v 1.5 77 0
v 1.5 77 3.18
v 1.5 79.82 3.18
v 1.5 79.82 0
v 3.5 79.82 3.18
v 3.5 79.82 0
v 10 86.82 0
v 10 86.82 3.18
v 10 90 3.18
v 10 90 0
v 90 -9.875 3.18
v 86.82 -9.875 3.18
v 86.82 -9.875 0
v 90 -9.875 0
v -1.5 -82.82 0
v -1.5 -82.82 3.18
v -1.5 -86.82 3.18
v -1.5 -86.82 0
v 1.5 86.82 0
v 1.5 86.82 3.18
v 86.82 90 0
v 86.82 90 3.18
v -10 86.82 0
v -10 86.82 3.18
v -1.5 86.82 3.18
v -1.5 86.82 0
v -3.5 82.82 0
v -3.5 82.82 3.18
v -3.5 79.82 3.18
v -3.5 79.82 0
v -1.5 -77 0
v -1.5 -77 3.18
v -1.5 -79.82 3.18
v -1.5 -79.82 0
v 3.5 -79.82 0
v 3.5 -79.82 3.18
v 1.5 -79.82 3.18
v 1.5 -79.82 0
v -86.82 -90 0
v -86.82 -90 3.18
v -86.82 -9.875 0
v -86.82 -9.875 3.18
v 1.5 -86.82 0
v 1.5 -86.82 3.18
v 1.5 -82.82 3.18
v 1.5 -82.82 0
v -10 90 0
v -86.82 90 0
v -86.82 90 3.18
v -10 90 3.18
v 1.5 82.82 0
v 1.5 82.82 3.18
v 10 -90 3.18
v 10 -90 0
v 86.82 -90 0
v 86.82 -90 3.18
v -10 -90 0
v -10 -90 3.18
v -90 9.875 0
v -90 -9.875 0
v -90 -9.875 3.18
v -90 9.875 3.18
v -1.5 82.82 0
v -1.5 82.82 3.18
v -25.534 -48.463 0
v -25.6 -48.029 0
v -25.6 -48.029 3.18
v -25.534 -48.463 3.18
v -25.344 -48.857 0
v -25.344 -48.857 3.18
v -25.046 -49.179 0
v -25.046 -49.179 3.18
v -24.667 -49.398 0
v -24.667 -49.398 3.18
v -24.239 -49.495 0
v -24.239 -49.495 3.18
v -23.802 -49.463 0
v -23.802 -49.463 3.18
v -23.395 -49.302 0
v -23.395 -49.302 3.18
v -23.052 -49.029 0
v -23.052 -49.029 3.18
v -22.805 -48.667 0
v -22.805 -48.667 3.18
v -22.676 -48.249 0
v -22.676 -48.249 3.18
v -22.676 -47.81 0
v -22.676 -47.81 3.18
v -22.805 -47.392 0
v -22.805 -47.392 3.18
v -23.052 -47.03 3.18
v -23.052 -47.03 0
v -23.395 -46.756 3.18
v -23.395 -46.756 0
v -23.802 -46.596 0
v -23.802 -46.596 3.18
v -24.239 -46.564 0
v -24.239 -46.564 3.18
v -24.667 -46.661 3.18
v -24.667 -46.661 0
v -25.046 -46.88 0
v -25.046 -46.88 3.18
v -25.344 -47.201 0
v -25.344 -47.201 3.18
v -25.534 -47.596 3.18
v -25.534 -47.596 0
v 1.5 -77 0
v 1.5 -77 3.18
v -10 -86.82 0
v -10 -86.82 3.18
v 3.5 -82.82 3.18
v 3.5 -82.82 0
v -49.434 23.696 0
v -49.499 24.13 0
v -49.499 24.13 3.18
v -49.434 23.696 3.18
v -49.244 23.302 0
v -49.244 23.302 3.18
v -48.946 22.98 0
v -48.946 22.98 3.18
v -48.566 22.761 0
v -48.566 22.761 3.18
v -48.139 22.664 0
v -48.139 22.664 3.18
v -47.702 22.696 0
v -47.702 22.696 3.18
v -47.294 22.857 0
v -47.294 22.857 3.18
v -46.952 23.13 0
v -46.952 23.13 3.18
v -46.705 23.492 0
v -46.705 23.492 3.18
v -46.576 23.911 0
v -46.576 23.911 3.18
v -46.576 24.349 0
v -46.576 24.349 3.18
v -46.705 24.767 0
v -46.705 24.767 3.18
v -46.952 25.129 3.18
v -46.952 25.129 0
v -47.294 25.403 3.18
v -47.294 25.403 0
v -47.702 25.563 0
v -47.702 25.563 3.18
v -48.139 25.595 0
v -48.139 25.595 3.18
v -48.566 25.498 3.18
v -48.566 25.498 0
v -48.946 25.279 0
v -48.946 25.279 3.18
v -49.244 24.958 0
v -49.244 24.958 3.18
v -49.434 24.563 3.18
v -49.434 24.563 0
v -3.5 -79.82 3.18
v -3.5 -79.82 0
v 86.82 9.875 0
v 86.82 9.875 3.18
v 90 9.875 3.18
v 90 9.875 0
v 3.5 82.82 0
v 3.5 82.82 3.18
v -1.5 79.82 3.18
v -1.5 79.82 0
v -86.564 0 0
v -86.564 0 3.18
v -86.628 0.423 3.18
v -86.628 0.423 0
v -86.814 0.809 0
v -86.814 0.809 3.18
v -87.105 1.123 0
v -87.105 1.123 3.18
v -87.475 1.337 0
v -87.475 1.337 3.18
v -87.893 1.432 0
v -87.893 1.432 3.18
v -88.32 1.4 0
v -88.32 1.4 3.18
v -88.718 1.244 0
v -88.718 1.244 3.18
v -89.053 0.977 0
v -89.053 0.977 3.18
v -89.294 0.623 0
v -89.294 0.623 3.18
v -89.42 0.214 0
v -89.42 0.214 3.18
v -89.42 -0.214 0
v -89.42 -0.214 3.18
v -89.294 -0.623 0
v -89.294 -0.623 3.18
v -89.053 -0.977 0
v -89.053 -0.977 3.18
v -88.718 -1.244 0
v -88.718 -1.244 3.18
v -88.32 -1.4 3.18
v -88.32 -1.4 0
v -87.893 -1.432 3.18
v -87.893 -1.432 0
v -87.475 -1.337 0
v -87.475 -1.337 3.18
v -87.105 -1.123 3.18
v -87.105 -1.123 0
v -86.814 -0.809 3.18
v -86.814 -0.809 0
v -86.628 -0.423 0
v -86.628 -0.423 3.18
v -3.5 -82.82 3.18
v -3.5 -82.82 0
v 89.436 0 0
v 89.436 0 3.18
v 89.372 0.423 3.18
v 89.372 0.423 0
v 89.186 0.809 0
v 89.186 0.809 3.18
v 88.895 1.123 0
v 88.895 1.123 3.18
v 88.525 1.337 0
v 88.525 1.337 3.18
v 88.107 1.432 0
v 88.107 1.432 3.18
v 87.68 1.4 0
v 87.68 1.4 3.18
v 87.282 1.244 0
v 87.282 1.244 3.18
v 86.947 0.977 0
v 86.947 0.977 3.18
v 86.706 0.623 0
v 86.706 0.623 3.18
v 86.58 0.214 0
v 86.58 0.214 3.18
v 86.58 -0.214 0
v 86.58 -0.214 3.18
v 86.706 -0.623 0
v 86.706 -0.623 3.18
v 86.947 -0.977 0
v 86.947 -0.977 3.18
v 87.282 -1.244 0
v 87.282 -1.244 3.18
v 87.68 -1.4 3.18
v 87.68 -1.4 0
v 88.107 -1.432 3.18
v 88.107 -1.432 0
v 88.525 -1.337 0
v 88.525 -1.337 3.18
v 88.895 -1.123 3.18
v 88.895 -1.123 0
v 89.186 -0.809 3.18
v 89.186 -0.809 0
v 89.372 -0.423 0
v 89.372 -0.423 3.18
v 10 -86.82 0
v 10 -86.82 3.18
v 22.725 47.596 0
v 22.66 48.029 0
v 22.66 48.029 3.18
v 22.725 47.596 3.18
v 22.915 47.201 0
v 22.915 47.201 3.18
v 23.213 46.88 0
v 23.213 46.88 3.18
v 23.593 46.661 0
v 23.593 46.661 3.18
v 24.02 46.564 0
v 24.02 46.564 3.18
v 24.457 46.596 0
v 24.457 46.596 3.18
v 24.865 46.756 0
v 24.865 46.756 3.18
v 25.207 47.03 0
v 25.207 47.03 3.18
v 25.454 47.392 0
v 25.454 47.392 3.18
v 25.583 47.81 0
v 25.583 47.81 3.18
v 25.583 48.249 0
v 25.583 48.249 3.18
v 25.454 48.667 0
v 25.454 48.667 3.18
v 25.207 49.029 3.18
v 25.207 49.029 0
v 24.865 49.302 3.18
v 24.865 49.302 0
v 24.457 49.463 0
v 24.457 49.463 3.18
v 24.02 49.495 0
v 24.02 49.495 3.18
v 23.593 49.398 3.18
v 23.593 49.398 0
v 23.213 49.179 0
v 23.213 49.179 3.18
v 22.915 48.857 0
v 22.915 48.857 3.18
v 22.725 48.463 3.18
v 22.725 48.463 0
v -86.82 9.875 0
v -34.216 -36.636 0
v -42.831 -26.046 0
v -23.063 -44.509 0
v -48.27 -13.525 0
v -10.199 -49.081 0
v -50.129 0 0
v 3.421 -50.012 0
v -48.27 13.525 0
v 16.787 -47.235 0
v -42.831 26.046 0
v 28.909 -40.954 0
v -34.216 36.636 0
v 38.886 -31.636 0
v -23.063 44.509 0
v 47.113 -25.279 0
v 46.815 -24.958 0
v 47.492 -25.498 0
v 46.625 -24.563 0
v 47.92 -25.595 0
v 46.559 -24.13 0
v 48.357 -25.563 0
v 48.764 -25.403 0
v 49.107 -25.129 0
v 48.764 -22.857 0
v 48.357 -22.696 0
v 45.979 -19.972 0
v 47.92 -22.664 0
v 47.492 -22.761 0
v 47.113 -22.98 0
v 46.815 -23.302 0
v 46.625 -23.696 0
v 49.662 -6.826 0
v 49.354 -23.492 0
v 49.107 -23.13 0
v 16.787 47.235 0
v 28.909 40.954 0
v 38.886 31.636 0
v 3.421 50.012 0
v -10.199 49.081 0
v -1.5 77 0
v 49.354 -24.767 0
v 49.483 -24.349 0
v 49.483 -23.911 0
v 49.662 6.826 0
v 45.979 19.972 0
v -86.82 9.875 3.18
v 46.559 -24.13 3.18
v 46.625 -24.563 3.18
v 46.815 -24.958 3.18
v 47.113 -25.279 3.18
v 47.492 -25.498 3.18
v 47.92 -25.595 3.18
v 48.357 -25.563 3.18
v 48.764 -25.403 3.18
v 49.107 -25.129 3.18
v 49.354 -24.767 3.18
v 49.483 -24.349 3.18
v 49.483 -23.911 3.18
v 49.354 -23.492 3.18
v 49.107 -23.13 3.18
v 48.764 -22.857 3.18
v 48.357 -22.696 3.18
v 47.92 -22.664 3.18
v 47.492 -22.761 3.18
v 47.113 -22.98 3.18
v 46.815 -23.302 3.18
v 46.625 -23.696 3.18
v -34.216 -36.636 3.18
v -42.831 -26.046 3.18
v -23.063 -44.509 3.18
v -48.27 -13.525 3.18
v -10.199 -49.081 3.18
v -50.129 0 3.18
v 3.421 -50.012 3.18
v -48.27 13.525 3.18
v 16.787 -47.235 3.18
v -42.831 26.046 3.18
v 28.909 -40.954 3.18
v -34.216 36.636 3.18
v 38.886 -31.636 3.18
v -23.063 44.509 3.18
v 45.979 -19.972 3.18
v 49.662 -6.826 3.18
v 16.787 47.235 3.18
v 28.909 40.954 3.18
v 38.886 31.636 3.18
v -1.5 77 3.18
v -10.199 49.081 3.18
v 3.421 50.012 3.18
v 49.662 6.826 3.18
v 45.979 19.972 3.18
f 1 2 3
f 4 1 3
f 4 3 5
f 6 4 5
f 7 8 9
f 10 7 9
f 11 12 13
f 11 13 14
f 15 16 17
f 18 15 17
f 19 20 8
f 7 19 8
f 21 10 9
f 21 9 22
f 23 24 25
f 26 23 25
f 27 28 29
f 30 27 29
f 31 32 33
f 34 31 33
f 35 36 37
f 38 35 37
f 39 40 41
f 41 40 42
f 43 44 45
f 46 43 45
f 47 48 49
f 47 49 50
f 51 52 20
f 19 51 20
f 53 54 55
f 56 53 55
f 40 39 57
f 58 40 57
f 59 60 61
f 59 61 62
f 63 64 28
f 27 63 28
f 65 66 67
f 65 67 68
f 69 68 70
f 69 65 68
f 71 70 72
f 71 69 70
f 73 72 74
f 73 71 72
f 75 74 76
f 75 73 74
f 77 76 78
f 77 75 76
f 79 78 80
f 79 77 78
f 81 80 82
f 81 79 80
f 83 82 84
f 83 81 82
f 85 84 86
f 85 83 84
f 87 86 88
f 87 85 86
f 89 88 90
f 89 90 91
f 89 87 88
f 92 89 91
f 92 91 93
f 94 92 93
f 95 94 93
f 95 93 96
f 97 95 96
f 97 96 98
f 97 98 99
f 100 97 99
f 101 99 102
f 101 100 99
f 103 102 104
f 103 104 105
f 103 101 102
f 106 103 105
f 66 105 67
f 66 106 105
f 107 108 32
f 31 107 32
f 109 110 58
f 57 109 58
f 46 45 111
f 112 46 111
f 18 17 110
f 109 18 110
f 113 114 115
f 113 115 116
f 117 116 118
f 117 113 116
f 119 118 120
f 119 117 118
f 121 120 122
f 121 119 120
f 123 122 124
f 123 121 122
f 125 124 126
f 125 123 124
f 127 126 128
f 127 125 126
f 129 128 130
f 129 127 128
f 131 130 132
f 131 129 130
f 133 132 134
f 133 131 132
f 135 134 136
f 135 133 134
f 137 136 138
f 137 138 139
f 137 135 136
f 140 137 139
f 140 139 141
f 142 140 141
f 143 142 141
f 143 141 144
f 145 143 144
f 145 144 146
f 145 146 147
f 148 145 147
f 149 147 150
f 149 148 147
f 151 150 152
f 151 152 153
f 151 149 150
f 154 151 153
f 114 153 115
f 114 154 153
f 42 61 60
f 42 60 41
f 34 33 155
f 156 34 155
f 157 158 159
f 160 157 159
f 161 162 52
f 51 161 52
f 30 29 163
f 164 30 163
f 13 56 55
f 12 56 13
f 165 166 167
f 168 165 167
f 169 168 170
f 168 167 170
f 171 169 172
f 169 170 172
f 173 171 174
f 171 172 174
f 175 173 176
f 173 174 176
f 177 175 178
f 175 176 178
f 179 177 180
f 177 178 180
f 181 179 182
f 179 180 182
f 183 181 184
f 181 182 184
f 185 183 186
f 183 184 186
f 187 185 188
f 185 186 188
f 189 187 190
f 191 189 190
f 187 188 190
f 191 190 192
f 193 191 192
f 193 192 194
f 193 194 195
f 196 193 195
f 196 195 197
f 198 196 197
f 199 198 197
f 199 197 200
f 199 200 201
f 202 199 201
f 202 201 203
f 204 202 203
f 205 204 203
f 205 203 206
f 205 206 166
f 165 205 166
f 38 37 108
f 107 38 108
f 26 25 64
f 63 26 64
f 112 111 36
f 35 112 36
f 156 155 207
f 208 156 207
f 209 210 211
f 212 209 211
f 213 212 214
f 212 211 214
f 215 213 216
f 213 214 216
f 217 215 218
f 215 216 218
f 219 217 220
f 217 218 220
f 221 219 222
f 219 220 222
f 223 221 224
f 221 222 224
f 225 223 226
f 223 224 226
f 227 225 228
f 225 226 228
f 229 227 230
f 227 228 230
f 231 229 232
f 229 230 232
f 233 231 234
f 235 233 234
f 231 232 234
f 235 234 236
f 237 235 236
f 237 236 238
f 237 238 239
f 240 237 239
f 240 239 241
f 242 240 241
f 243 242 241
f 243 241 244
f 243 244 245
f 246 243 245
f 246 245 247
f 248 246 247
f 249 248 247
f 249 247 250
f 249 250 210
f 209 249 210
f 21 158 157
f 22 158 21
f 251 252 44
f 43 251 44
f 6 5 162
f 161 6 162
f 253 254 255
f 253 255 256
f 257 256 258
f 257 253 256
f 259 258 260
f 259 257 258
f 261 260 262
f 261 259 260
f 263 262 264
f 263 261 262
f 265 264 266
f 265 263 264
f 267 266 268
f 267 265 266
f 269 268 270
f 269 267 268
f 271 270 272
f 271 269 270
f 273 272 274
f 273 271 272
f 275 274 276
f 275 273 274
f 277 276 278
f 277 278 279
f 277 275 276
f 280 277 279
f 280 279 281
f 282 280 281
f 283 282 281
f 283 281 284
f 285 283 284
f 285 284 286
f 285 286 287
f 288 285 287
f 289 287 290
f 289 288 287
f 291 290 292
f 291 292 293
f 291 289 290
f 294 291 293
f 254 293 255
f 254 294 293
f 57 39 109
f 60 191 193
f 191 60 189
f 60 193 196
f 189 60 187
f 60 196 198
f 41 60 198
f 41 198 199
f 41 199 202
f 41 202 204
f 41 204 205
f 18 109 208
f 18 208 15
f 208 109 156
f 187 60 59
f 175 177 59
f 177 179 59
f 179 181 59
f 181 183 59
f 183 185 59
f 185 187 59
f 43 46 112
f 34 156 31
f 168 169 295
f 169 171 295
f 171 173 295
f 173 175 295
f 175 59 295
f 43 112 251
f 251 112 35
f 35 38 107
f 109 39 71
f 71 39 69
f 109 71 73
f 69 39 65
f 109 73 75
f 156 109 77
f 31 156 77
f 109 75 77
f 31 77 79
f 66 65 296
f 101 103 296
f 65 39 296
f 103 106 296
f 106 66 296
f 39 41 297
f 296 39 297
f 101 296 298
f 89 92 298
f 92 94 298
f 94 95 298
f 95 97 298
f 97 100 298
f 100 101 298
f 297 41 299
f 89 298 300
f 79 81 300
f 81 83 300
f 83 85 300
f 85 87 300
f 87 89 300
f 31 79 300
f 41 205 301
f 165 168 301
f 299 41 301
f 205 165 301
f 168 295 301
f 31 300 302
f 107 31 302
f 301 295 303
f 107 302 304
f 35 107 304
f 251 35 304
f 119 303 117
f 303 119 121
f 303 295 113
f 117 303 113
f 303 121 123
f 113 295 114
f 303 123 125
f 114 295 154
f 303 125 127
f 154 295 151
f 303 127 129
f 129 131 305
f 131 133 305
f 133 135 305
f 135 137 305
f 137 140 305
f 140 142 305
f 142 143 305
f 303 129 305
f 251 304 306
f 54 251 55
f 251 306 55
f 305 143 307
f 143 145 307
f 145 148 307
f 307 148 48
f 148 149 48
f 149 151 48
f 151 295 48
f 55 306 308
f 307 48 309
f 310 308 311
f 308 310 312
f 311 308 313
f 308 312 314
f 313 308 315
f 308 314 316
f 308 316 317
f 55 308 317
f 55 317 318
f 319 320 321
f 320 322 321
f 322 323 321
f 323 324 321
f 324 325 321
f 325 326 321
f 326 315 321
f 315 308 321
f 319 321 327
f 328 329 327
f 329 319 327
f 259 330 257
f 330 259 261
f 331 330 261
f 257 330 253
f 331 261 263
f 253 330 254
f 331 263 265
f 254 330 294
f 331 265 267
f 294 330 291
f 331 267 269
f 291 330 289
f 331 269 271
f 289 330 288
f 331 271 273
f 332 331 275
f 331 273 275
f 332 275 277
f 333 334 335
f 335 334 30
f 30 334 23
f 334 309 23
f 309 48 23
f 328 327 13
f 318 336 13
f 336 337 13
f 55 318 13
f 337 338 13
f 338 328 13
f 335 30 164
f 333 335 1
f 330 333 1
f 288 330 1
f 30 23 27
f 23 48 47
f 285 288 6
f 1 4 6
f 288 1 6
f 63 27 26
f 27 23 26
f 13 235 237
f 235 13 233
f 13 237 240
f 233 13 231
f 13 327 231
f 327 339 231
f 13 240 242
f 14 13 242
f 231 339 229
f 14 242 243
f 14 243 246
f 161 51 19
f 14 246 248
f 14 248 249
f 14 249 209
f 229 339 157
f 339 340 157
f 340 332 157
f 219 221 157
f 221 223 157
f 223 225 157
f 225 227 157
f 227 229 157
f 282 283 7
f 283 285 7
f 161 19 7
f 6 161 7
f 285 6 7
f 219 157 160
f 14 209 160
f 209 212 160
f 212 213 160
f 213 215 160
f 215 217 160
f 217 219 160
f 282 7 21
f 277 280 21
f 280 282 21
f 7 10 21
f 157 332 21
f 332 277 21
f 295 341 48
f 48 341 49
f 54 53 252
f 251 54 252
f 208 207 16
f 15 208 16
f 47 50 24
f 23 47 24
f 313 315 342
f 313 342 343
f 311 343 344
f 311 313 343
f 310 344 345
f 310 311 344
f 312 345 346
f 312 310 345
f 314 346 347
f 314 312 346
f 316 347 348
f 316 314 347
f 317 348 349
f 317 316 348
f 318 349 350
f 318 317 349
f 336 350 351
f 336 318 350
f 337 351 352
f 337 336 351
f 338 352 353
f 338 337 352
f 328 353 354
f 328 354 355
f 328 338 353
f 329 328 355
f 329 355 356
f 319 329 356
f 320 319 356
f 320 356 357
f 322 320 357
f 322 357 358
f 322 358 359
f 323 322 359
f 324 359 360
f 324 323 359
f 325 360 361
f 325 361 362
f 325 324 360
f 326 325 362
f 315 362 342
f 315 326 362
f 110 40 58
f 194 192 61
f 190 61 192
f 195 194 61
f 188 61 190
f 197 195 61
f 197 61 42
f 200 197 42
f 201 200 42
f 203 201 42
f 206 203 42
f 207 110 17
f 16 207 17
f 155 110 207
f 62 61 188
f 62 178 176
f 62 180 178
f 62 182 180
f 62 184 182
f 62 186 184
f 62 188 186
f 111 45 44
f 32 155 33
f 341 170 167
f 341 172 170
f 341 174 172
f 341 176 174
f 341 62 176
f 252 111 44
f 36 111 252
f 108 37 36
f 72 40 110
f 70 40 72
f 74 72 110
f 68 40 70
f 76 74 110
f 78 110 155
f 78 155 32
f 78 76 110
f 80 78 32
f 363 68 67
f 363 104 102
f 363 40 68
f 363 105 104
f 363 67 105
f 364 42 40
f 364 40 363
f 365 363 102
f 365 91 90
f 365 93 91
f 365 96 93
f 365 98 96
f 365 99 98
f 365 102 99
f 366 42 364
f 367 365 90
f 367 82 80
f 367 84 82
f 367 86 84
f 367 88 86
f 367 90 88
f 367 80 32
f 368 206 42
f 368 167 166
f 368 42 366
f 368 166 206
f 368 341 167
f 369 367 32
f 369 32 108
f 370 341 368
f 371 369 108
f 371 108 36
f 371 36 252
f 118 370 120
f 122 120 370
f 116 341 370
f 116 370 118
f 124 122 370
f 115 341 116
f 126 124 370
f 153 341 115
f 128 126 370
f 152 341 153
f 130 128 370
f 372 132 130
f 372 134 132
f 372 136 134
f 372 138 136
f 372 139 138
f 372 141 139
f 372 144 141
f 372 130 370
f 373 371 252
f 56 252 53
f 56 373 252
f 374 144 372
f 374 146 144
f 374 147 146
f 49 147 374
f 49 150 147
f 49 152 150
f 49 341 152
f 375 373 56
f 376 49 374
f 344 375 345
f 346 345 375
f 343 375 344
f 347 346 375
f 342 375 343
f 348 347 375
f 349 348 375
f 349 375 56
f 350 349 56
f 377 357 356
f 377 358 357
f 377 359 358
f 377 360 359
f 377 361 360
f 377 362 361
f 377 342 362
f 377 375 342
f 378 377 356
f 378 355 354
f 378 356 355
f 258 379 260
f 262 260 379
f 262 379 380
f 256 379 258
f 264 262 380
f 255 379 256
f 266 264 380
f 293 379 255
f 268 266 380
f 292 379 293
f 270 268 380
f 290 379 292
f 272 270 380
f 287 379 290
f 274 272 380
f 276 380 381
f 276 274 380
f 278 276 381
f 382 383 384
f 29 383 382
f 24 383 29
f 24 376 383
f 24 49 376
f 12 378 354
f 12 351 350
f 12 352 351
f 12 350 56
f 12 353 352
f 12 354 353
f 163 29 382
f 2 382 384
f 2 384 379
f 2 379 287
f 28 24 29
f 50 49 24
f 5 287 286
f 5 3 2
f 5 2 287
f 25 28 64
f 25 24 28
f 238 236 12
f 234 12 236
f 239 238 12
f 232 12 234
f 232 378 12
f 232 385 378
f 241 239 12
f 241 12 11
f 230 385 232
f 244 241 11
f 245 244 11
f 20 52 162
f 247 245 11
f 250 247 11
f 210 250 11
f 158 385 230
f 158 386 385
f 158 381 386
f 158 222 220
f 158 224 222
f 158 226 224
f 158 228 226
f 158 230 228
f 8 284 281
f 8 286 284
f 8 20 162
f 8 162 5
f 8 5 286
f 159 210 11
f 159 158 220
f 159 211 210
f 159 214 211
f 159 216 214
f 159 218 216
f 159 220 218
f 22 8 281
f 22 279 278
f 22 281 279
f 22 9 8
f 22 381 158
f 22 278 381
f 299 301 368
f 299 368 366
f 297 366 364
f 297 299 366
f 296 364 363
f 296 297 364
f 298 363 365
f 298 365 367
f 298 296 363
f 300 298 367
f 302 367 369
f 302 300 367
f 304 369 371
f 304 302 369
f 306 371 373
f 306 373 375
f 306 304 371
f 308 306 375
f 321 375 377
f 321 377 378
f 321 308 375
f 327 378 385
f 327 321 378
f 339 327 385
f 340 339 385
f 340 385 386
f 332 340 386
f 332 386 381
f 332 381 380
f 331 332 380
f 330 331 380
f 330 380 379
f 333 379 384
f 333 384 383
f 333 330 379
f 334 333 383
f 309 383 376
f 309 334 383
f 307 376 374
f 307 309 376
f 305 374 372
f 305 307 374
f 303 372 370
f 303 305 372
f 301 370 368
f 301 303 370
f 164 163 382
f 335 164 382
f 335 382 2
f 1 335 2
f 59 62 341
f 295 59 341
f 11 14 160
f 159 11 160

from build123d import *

# Parameters (mm, degrees)
SKETCH3_W           = 180
SKETCH3_H           = 180
SKETCH3_R           = 50.129190947
SKETCH3_R_2         = 1.47
BOSS_EXTRUDE1_DEPTH = 3.18
CUT_EXTRUDE1_DEPTH  = 128.318939675
SKETCH5_R           = 1.436023081
SKETCH5_W           = 3.18
SKETCH5_H           = 80.125
CUT_EXTRUDE2_DEPTH  = 128.318939675


with BuildPart() as part:
    # Sketch3 → Boss-Extrude1 (new body)
    with BuildSketch(Plane.XY):
        Rectangle(SKETCH3_W, SKETCH3_H)
        with Locations(Location((0, 0, 0), (0, 0, 180))):
            Circle(SKETCH3_R, mode=Mode.SUBTRACT)
        with Locations(Location((-48.029419272, 24.129595611, 0), (0, 0, 180))):
            Circle(SKETCH3_R_2, mode=Mode.SUBTRACT)
        with Locations(Location((-24.129595611, -48.029419272, 0), (0, 0, 180))):
            Circle(SKETCH3_R_2, mode=Mode.SUBTRACT)
        with Locations(Location((48.029419272, -24.129595611, 0), (0, 0, 180))):
            Circle(SKETCH3_R_2, mode=Mode.SUBTRACT)
        with Locations(Location((24.129595611, 48.029419272, 0), (0, 0, 180))):
            Circle(SKETCH3_R_2, mode=Mode.SUBTRACT)
    extrude(amount=BOSS_EXTRUDE1_DEPTH)

    # Sketch4 → Cut-Extrude1 (cut, through all)
    with BuildSketch(Plane.XY.offset(3.18)):
        Polygon((1.5, 86.82), (10, 86.82), (10, 90), (-10, 90), (-10, 86.82), (-1.5, 86.82), (-1.5, 82.82), (-3.5, 82.82), (-3.5, 79.82), (-1.5, 79.82), (-1.5, 77), (1.5, 77), (1.5, 79.82), (3.5, 79.82), (3.5, 82.82), (1.5, 82.82), align=None)
        Polygon((1.5, -79.82), (1.5, -77), (-1.5, -77), (-1.5, -79.82), (-3.5, -79.82), (-3.5, -82.82), (-1.5, -82.82), (-1.5, -86.82), (-10, -86.82), (-10, -90), (10, -90), (10, -86.82), (1.5, -86.82), (1.5, -82.82), (3.5, -82.82), (3.5, -79.82), align=None)
    extrude(amount=-CUT_EXTRUDE1_DEPTH, mode=Mode.SUBTRACT)

    # Sketch5 → Cut-Extrude2 (cut, through all)
    with BuildSketch(Plane.XY.offset(3.18)):
        with Locations((-88, 0)):
            Circle(SKETCH5_R)
        with Locations((88, 0)):
            Circle(SKETCH5_R)
        with Locations((-88.41, 49.9375)):
            Rectangle(SKETCH5_W, SKETCH5_H)
        with Locations((-88.41, -49.9375)):
            Rectangle(SKETCH5_W, SKETCH5_H)
        with Locations((88.41, -49.9375)):
            Rectangle(SKETCH5_W, SKETCH5_H)
        with Locations((88.41, 49.9375)):
            Rectangle(SKETCH5_W, SKETCH5_H)
    extrude(amount=-CUT_EXTRUDE2_DEPTH, mode=Mode.SUBTRACT)


solid = part.part
